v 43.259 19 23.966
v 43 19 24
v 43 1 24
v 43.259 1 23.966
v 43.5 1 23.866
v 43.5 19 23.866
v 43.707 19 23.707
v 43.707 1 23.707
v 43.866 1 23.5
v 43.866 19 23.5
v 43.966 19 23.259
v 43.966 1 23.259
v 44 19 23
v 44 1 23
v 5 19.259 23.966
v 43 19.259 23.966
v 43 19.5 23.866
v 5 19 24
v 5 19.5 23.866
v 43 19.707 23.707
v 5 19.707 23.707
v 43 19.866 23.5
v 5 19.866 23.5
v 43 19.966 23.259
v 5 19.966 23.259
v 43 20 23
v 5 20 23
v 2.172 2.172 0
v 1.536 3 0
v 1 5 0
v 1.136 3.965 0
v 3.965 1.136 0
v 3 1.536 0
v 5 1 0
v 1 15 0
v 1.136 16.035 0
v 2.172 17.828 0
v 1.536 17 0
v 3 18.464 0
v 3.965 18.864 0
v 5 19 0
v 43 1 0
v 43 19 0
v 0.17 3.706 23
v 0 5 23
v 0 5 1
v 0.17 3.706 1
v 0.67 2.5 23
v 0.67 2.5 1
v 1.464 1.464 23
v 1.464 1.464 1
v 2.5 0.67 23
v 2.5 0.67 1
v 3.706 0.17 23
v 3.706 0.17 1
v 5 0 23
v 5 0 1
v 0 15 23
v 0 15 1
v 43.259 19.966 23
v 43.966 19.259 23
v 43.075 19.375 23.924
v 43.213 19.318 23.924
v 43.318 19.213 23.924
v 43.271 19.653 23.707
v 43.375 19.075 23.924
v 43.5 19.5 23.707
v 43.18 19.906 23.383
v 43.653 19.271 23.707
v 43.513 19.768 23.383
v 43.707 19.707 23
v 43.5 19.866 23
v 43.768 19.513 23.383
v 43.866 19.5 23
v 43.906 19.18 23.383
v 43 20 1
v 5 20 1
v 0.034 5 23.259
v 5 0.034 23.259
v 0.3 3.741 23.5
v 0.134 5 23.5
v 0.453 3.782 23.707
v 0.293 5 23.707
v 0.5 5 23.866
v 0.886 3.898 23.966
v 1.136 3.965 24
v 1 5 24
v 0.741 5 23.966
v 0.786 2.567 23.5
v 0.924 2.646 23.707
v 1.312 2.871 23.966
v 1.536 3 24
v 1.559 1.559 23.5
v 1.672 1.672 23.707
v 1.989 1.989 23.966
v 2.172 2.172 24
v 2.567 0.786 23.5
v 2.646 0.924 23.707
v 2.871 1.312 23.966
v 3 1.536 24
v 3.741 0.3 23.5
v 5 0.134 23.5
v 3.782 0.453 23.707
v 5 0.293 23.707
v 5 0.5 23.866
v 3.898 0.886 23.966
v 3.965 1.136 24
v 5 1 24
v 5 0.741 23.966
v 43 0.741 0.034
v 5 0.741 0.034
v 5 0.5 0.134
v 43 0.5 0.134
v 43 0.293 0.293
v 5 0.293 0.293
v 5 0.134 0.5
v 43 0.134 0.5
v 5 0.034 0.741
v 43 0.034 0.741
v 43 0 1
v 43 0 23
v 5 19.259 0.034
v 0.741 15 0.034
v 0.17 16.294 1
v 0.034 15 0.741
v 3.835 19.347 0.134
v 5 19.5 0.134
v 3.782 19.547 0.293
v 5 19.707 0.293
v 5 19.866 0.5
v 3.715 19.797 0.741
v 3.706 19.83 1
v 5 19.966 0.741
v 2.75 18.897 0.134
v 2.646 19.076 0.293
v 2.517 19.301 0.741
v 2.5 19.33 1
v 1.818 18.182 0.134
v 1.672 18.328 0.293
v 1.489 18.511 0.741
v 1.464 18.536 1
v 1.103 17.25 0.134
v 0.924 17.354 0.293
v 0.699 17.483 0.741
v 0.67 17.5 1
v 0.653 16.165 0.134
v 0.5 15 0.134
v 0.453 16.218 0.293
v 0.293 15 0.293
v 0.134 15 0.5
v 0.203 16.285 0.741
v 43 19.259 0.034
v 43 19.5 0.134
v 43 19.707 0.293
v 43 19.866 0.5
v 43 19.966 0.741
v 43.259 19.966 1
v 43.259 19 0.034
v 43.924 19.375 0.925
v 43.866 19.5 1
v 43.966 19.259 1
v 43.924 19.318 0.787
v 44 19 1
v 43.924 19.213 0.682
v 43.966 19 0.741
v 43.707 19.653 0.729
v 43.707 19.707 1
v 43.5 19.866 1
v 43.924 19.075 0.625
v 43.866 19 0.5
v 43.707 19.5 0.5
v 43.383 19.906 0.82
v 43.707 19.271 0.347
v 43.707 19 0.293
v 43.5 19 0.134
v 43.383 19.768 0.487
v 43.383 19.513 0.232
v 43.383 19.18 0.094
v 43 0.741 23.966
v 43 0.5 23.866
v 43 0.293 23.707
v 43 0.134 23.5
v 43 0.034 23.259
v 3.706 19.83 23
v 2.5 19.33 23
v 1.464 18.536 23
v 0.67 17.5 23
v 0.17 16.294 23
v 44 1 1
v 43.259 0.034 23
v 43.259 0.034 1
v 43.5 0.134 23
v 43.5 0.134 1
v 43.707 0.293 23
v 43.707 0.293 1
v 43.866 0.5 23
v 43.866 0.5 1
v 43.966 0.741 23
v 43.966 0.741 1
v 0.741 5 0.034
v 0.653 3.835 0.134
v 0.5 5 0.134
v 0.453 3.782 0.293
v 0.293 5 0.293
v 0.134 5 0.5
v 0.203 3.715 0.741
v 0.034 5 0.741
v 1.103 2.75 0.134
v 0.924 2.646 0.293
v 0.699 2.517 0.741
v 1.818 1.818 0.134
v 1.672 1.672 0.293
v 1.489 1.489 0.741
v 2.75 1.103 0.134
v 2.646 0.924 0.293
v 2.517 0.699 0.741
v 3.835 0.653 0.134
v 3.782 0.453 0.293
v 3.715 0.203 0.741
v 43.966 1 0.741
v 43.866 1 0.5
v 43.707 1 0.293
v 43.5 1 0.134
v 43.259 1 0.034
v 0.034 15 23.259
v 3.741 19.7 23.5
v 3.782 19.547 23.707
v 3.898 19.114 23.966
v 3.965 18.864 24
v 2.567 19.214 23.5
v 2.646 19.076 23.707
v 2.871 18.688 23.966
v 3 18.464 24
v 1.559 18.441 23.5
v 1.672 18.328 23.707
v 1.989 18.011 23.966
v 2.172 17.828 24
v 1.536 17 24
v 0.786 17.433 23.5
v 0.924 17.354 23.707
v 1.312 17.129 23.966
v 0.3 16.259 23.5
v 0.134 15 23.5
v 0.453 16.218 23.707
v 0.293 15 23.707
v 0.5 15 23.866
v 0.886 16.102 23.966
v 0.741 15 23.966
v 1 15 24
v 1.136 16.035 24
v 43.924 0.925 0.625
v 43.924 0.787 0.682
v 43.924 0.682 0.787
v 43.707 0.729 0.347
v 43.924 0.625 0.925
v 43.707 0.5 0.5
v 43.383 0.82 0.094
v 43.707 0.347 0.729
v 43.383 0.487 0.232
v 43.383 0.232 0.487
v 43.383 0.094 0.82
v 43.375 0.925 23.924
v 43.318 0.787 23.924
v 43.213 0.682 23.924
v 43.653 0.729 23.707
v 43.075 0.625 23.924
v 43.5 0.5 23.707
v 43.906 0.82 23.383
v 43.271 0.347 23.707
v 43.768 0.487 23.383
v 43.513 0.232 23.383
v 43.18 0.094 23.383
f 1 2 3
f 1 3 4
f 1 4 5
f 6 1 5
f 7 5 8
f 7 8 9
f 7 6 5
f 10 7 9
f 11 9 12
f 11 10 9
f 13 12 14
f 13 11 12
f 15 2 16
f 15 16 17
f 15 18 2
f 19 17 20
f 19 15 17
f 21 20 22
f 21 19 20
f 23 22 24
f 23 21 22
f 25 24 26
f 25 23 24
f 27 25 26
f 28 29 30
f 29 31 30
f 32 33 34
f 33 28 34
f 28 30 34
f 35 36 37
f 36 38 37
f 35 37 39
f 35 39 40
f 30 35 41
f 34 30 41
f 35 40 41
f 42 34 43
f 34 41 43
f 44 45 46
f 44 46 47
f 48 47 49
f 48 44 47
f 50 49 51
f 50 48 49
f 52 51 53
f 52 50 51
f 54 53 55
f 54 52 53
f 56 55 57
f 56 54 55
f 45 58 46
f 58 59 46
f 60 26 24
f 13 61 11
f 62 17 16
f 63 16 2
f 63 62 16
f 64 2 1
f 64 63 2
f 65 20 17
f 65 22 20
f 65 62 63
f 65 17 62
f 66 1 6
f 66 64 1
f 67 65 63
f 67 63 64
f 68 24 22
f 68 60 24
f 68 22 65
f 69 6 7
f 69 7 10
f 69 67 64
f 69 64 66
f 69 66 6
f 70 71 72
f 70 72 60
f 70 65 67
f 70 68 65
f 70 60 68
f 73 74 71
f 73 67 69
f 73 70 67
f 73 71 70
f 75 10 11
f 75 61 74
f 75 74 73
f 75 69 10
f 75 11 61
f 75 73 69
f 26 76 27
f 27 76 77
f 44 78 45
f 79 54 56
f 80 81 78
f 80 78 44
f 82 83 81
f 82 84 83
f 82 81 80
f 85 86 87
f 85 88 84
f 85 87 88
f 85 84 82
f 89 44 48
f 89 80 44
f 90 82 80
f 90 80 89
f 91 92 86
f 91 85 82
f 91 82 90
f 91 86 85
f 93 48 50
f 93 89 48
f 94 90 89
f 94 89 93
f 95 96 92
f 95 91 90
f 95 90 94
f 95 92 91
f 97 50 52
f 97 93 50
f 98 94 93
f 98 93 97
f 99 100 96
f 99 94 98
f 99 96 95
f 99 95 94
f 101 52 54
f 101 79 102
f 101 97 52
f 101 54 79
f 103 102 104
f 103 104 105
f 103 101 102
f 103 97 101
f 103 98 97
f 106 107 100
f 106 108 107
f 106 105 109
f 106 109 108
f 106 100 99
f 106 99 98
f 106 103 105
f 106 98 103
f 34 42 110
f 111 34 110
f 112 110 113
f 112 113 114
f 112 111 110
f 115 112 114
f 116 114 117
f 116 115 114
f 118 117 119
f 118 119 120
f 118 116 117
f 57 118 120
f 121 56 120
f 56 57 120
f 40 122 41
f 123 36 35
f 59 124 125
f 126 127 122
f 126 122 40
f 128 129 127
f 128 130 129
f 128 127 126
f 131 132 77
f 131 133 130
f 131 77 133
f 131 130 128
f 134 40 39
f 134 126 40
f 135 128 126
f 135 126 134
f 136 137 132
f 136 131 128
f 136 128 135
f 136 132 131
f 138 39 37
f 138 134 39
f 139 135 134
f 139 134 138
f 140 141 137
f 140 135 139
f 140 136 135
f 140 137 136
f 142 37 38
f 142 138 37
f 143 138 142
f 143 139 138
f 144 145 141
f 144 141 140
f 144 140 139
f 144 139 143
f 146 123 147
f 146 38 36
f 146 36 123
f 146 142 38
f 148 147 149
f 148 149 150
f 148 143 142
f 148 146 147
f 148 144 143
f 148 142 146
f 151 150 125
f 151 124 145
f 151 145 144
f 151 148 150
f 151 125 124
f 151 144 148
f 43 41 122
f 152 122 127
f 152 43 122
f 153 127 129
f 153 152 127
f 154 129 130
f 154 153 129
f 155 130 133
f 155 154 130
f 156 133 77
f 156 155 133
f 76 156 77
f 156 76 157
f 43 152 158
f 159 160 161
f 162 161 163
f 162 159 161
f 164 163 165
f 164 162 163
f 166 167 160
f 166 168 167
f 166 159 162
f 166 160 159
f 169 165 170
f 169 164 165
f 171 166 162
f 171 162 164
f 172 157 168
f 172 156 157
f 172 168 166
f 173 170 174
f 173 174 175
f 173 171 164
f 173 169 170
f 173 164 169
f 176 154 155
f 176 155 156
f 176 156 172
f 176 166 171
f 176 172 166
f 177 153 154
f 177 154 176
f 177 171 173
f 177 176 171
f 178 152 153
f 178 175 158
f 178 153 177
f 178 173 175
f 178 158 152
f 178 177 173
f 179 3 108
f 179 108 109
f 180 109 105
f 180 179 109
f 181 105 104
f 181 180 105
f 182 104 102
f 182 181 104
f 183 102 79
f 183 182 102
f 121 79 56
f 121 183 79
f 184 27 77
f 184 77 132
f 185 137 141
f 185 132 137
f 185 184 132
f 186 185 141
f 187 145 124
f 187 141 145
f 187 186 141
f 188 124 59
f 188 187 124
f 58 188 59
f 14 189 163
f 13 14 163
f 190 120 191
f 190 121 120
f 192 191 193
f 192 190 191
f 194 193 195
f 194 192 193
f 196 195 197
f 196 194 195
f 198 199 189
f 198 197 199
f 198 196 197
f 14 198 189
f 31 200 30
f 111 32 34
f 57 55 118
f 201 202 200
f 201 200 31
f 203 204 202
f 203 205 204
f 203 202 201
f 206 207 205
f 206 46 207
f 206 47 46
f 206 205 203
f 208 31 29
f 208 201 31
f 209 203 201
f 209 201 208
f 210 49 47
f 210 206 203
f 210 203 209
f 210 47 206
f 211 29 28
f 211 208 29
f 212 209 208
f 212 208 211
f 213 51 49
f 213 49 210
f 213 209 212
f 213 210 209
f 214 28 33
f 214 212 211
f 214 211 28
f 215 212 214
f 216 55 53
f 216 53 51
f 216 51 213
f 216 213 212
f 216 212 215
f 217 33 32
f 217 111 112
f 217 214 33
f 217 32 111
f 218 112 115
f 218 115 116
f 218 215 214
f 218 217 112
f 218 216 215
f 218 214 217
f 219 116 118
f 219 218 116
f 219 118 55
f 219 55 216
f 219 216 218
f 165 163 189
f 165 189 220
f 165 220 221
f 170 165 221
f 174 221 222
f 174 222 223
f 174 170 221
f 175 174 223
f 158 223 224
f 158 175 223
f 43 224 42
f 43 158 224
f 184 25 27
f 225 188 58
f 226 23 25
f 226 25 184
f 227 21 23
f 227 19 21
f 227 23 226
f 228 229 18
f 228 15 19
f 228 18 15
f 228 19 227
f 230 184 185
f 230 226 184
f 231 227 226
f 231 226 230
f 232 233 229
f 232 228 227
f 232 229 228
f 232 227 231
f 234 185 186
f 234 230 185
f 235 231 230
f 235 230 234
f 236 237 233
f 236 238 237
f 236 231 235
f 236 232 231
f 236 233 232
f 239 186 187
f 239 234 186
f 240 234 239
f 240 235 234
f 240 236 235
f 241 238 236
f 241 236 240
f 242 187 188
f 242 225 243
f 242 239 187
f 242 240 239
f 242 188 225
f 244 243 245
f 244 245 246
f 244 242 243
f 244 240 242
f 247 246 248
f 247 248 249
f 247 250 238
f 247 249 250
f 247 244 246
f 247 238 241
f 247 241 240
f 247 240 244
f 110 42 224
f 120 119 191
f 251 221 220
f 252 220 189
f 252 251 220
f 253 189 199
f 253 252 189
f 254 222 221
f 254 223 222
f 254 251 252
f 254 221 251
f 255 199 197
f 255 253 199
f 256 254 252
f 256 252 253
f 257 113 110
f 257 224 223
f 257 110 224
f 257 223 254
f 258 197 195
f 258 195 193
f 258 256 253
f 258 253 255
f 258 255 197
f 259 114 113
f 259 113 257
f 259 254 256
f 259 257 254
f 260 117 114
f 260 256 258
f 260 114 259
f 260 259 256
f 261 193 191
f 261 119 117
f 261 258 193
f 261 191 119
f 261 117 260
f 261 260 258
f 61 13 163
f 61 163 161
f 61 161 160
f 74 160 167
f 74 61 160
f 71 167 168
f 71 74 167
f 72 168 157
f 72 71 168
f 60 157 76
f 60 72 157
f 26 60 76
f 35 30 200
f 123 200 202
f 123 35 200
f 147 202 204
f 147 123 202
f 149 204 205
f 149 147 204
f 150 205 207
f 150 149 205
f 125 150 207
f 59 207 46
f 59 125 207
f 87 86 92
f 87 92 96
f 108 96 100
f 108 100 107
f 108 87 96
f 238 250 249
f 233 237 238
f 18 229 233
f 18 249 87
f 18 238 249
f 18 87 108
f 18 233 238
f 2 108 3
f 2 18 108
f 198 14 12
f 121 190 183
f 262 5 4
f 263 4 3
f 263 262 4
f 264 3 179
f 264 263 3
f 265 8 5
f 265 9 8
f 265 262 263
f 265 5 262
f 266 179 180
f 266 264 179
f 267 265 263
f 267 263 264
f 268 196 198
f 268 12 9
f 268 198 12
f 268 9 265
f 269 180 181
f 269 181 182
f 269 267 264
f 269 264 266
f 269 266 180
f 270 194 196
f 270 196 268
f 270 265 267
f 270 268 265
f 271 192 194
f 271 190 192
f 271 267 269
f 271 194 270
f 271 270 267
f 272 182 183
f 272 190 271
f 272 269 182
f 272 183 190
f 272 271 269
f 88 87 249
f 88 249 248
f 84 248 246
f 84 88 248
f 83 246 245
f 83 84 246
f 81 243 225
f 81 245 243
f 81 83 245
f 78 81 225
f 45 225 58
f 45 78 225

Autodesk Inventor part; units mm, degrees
ref_plane "YZ Plane" through (0, 0, 0) normal (1, 0, 0) x (0, 1, 0)
ref_plane "XZ Plane" through (0, 0, 0) normal (0, 1, 0) x (-1, 0, 0)
ref_plane "XY Plane" through (0, 0, 0) normal (0, 0, 1) x (1, 0, 0)
sketch "Náčrt1" plane through (0, 0, 0) normal (0, 0, 1) x (1, 0, 0)
  line L0 (0, 0) -> (44, 0)
  line L1 (44, 0) -> (44, 20)
  line L2 (44, 20) -> (0, 20)
  line L3 (0, 20) -> (0, 0)
  dimension "d0" = 44
  dimension "d1" = 20
extrude "Vysunutí1" add sketch "Náčrt1" along normal blind 24
fillet "Zaoblení1" radius 5 2 edges at (0, 20, 12) (0, 0, 12)
fillet "Zaoblení2" radius 1 14 edges at (1.4645, 18.5355, 0) (0, 10, 0) (1.4645, 1.4645, 0) (24.5, 0, 0) (24.5, 20, 0) (44, 10, 0) (44, 20, 12) (44, 0, 12) (44, 10, 24) (1.4645, 1.4645, 24) (0, 10, 24) (1.4645, 18.5355, 24) (24.5, 20, 24) (24.5, 0, 24)
properties part number "baterie"
